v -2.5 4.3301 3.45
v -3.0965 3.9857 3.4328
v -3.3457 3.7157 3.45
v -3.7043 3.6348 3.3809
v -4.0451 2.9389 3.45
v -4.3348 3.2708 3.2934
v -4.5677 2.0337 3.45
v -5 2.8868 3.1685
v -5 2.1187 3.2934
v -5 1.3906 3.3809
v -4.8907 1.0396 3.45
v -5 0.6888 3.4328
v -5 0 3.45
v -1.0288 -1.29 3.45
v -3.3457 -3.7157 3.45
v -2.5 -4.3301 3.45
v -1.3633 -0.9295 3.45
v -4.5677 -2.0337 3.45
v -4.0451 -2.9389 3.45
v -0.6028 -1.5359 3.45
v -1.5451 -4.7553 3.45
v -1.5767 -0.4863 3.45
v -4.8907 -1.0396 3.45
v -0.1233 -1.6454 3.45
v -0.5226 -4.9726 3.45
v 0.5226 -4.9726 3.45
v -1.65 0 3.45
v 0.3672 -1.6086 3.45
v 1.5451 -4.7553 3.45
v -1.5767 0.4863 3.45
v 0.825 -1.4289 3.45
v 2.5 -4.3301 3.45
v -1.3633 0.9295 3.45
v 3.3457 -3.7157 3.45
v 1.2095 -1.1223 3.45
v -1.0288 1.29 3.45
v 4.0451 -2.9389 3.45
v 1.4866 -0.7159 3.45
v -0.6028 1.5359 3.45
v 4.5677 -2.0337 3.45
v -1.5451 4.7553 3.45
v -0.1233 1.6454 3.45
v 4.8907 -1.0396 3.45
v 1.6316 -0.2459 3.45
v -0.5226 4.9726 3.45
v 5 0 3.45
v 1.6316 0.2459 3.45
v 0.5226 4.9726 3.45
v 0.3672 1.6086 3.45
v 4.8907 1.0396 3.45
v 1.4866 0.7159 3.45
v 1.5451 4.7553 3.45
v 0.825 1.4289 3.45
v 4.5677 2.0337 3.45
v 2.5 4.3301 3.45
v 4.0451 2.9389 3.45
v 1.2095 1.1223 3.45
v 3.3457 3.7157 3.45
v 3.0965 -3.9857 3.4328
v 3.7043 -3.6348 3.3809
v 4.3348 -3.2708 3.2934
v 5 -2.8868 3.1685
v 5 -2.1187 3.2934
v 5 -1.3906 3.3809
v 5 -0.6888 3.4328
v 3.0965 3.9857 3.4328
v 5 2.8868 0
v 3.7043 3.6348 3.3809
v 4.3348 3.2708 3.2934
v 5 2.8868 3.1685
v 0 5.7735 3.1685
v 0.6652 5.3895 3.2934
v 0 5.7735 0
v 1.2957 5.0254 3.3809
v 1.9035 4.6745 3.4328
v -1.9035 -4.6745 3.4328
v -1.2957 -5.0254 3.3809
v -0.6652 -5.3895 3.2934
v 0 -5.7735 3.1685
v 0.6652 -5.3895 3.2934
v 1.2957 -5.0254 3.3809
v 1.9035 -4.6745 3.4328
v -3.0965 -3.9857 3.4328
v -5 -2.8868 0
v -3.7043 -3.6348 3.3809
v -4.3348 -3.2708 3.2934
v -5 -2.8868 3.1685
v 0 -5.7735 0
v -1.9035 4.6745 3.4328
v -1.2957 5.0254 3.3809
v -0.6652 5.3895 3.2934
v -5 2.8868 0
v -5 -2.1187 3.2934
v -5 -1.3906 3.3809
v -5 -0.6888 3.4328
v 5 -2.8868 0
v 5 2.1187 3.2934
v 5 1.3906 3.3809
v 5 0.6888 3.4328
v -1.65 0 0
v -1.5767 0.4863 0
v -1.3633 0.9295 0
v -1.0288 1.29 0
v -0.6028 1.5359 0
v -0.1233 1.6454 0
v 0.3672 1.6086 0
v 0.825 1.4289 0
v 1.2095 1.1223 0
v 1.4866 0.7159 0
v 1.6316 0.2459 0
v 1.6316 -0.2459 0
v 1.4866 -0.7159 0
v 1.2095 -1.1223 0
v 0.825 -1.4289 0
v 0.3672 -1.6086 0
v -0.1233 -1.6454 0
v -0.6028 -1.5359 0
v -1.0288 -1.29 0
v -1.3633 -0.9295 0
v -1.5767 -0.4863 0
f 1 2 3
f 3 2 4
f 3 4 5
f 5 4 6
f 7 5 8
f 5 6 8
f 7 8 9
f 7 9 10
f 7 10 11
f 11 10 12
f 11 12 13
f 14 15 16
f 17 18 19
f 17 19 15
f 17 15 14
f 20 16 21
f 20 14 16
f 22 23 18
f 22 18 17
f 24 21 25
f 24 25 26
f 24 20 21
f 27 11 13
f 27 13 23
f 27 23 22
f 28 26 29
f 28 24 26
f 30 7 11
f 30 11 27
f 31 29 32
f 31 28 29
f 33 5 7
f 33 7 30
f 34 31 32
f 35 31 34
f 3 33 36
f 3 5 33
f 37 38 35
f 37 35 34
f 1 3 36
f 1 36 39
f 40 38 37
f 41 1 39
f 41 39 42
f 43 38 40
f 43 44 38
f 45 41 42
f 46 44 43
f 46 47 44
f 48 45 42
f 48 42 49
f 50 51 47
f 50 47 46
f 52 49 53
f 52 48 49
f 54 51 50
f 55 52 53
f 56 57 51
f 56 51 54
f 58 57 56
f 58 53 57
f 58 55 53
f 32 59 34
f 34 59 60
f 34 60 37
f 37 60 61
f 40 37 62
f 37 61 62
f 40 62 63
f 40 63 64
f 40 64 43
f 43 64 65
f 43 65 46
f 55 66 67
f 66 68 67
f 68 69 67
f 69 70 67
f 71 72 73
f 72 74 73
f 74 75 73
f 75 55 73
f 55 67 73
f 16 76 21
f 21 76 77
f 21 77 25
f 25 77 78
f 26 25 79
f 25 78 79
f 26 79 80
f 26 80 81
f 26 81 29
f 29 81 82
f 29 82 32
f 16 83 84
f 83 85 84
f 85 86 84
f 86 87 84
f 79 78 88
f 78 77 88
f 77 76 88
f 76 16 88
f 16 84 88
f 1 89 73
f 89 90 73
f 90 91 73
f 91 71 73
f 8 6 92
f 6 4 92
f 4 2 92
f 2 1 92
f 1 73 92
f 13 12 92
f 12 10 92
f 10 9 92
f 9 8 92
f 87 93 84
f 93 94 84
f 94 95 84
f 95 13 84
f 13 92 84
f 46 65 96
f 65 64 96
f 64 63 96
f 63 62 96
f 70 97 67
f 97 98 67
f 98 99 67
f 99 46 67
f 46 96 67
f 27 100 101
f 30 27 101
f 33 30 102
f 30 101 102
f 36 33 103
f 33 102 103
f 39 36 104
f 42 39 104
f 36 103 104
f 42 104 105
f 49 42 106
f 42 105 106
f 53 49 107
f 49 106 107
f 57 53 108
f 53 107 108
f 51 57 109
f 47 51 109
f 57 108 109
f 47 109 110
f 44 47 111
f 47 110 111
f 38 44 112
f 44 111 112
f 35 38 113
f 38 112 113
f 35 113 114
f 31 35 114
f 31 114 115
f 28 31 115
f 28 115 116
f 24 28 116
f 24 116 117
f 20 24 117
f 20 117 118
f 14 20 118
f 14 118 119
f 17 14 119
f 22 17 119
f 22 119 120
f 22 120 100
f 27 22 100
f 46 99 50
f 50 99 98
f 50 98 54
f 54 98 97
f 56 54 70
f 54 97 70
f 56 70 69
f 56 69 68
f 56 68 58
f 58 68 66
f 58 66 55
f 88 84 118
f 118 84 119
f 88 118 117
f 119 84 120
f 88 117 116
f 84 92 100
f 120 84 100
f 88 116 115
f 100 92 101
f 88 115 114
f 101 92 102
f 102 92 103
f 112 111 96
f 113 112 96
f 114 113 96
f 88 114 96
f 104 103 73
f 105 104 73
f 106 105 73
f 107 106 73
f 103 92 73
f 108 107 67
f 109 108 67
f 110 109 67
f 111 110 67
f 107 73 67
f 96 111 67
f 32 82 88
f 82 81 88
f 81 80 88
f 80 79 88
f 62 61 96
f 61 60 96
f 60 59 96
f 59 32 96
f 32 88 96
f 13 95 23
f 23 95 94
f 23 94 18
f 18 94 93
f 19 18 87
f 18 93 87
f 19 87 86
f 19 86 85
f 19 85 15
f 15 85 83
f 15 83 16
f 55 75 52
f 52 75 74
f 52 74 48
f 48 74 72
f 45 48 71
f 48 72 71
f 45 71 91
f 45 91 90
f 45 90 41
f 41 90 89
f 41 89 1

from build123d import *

# Parameters (mm, degrees)
F1_DEPTH = 3.45
F5_D     = 3.3


with BuildPart() as f1:
    # F0 (on Top) → F1 (new body)
    with BuildSketch(Plane.XY):
        Polygon((5, -2.8867513459), (5, 2.8867513459), (0, 5.7735026919), (-5, 2.8867513459), (-5, -2.8867513459), (0, -5.7735026919), align=None)
    extrude(amount=F1_DEPTH)

    # F2 (on Front) → F3 (revolve, cut)
    with BuildSketch(Plane.XZ):
        Polygon((6.9201928239, 3.45), (5, 3.45), (6.9201928239, 2.751106968), align=None)
    revolve(axis=Axis((0, 0, 1.725), (0, 0, 1)), mode=Mode.SUBTRACT)

    # F5 (through all)
    with Locations(Plane.XY.offset(3.45)):
        with Locations((0, 0)):
            Hole(F5_D / 2)


solid = f1.part
